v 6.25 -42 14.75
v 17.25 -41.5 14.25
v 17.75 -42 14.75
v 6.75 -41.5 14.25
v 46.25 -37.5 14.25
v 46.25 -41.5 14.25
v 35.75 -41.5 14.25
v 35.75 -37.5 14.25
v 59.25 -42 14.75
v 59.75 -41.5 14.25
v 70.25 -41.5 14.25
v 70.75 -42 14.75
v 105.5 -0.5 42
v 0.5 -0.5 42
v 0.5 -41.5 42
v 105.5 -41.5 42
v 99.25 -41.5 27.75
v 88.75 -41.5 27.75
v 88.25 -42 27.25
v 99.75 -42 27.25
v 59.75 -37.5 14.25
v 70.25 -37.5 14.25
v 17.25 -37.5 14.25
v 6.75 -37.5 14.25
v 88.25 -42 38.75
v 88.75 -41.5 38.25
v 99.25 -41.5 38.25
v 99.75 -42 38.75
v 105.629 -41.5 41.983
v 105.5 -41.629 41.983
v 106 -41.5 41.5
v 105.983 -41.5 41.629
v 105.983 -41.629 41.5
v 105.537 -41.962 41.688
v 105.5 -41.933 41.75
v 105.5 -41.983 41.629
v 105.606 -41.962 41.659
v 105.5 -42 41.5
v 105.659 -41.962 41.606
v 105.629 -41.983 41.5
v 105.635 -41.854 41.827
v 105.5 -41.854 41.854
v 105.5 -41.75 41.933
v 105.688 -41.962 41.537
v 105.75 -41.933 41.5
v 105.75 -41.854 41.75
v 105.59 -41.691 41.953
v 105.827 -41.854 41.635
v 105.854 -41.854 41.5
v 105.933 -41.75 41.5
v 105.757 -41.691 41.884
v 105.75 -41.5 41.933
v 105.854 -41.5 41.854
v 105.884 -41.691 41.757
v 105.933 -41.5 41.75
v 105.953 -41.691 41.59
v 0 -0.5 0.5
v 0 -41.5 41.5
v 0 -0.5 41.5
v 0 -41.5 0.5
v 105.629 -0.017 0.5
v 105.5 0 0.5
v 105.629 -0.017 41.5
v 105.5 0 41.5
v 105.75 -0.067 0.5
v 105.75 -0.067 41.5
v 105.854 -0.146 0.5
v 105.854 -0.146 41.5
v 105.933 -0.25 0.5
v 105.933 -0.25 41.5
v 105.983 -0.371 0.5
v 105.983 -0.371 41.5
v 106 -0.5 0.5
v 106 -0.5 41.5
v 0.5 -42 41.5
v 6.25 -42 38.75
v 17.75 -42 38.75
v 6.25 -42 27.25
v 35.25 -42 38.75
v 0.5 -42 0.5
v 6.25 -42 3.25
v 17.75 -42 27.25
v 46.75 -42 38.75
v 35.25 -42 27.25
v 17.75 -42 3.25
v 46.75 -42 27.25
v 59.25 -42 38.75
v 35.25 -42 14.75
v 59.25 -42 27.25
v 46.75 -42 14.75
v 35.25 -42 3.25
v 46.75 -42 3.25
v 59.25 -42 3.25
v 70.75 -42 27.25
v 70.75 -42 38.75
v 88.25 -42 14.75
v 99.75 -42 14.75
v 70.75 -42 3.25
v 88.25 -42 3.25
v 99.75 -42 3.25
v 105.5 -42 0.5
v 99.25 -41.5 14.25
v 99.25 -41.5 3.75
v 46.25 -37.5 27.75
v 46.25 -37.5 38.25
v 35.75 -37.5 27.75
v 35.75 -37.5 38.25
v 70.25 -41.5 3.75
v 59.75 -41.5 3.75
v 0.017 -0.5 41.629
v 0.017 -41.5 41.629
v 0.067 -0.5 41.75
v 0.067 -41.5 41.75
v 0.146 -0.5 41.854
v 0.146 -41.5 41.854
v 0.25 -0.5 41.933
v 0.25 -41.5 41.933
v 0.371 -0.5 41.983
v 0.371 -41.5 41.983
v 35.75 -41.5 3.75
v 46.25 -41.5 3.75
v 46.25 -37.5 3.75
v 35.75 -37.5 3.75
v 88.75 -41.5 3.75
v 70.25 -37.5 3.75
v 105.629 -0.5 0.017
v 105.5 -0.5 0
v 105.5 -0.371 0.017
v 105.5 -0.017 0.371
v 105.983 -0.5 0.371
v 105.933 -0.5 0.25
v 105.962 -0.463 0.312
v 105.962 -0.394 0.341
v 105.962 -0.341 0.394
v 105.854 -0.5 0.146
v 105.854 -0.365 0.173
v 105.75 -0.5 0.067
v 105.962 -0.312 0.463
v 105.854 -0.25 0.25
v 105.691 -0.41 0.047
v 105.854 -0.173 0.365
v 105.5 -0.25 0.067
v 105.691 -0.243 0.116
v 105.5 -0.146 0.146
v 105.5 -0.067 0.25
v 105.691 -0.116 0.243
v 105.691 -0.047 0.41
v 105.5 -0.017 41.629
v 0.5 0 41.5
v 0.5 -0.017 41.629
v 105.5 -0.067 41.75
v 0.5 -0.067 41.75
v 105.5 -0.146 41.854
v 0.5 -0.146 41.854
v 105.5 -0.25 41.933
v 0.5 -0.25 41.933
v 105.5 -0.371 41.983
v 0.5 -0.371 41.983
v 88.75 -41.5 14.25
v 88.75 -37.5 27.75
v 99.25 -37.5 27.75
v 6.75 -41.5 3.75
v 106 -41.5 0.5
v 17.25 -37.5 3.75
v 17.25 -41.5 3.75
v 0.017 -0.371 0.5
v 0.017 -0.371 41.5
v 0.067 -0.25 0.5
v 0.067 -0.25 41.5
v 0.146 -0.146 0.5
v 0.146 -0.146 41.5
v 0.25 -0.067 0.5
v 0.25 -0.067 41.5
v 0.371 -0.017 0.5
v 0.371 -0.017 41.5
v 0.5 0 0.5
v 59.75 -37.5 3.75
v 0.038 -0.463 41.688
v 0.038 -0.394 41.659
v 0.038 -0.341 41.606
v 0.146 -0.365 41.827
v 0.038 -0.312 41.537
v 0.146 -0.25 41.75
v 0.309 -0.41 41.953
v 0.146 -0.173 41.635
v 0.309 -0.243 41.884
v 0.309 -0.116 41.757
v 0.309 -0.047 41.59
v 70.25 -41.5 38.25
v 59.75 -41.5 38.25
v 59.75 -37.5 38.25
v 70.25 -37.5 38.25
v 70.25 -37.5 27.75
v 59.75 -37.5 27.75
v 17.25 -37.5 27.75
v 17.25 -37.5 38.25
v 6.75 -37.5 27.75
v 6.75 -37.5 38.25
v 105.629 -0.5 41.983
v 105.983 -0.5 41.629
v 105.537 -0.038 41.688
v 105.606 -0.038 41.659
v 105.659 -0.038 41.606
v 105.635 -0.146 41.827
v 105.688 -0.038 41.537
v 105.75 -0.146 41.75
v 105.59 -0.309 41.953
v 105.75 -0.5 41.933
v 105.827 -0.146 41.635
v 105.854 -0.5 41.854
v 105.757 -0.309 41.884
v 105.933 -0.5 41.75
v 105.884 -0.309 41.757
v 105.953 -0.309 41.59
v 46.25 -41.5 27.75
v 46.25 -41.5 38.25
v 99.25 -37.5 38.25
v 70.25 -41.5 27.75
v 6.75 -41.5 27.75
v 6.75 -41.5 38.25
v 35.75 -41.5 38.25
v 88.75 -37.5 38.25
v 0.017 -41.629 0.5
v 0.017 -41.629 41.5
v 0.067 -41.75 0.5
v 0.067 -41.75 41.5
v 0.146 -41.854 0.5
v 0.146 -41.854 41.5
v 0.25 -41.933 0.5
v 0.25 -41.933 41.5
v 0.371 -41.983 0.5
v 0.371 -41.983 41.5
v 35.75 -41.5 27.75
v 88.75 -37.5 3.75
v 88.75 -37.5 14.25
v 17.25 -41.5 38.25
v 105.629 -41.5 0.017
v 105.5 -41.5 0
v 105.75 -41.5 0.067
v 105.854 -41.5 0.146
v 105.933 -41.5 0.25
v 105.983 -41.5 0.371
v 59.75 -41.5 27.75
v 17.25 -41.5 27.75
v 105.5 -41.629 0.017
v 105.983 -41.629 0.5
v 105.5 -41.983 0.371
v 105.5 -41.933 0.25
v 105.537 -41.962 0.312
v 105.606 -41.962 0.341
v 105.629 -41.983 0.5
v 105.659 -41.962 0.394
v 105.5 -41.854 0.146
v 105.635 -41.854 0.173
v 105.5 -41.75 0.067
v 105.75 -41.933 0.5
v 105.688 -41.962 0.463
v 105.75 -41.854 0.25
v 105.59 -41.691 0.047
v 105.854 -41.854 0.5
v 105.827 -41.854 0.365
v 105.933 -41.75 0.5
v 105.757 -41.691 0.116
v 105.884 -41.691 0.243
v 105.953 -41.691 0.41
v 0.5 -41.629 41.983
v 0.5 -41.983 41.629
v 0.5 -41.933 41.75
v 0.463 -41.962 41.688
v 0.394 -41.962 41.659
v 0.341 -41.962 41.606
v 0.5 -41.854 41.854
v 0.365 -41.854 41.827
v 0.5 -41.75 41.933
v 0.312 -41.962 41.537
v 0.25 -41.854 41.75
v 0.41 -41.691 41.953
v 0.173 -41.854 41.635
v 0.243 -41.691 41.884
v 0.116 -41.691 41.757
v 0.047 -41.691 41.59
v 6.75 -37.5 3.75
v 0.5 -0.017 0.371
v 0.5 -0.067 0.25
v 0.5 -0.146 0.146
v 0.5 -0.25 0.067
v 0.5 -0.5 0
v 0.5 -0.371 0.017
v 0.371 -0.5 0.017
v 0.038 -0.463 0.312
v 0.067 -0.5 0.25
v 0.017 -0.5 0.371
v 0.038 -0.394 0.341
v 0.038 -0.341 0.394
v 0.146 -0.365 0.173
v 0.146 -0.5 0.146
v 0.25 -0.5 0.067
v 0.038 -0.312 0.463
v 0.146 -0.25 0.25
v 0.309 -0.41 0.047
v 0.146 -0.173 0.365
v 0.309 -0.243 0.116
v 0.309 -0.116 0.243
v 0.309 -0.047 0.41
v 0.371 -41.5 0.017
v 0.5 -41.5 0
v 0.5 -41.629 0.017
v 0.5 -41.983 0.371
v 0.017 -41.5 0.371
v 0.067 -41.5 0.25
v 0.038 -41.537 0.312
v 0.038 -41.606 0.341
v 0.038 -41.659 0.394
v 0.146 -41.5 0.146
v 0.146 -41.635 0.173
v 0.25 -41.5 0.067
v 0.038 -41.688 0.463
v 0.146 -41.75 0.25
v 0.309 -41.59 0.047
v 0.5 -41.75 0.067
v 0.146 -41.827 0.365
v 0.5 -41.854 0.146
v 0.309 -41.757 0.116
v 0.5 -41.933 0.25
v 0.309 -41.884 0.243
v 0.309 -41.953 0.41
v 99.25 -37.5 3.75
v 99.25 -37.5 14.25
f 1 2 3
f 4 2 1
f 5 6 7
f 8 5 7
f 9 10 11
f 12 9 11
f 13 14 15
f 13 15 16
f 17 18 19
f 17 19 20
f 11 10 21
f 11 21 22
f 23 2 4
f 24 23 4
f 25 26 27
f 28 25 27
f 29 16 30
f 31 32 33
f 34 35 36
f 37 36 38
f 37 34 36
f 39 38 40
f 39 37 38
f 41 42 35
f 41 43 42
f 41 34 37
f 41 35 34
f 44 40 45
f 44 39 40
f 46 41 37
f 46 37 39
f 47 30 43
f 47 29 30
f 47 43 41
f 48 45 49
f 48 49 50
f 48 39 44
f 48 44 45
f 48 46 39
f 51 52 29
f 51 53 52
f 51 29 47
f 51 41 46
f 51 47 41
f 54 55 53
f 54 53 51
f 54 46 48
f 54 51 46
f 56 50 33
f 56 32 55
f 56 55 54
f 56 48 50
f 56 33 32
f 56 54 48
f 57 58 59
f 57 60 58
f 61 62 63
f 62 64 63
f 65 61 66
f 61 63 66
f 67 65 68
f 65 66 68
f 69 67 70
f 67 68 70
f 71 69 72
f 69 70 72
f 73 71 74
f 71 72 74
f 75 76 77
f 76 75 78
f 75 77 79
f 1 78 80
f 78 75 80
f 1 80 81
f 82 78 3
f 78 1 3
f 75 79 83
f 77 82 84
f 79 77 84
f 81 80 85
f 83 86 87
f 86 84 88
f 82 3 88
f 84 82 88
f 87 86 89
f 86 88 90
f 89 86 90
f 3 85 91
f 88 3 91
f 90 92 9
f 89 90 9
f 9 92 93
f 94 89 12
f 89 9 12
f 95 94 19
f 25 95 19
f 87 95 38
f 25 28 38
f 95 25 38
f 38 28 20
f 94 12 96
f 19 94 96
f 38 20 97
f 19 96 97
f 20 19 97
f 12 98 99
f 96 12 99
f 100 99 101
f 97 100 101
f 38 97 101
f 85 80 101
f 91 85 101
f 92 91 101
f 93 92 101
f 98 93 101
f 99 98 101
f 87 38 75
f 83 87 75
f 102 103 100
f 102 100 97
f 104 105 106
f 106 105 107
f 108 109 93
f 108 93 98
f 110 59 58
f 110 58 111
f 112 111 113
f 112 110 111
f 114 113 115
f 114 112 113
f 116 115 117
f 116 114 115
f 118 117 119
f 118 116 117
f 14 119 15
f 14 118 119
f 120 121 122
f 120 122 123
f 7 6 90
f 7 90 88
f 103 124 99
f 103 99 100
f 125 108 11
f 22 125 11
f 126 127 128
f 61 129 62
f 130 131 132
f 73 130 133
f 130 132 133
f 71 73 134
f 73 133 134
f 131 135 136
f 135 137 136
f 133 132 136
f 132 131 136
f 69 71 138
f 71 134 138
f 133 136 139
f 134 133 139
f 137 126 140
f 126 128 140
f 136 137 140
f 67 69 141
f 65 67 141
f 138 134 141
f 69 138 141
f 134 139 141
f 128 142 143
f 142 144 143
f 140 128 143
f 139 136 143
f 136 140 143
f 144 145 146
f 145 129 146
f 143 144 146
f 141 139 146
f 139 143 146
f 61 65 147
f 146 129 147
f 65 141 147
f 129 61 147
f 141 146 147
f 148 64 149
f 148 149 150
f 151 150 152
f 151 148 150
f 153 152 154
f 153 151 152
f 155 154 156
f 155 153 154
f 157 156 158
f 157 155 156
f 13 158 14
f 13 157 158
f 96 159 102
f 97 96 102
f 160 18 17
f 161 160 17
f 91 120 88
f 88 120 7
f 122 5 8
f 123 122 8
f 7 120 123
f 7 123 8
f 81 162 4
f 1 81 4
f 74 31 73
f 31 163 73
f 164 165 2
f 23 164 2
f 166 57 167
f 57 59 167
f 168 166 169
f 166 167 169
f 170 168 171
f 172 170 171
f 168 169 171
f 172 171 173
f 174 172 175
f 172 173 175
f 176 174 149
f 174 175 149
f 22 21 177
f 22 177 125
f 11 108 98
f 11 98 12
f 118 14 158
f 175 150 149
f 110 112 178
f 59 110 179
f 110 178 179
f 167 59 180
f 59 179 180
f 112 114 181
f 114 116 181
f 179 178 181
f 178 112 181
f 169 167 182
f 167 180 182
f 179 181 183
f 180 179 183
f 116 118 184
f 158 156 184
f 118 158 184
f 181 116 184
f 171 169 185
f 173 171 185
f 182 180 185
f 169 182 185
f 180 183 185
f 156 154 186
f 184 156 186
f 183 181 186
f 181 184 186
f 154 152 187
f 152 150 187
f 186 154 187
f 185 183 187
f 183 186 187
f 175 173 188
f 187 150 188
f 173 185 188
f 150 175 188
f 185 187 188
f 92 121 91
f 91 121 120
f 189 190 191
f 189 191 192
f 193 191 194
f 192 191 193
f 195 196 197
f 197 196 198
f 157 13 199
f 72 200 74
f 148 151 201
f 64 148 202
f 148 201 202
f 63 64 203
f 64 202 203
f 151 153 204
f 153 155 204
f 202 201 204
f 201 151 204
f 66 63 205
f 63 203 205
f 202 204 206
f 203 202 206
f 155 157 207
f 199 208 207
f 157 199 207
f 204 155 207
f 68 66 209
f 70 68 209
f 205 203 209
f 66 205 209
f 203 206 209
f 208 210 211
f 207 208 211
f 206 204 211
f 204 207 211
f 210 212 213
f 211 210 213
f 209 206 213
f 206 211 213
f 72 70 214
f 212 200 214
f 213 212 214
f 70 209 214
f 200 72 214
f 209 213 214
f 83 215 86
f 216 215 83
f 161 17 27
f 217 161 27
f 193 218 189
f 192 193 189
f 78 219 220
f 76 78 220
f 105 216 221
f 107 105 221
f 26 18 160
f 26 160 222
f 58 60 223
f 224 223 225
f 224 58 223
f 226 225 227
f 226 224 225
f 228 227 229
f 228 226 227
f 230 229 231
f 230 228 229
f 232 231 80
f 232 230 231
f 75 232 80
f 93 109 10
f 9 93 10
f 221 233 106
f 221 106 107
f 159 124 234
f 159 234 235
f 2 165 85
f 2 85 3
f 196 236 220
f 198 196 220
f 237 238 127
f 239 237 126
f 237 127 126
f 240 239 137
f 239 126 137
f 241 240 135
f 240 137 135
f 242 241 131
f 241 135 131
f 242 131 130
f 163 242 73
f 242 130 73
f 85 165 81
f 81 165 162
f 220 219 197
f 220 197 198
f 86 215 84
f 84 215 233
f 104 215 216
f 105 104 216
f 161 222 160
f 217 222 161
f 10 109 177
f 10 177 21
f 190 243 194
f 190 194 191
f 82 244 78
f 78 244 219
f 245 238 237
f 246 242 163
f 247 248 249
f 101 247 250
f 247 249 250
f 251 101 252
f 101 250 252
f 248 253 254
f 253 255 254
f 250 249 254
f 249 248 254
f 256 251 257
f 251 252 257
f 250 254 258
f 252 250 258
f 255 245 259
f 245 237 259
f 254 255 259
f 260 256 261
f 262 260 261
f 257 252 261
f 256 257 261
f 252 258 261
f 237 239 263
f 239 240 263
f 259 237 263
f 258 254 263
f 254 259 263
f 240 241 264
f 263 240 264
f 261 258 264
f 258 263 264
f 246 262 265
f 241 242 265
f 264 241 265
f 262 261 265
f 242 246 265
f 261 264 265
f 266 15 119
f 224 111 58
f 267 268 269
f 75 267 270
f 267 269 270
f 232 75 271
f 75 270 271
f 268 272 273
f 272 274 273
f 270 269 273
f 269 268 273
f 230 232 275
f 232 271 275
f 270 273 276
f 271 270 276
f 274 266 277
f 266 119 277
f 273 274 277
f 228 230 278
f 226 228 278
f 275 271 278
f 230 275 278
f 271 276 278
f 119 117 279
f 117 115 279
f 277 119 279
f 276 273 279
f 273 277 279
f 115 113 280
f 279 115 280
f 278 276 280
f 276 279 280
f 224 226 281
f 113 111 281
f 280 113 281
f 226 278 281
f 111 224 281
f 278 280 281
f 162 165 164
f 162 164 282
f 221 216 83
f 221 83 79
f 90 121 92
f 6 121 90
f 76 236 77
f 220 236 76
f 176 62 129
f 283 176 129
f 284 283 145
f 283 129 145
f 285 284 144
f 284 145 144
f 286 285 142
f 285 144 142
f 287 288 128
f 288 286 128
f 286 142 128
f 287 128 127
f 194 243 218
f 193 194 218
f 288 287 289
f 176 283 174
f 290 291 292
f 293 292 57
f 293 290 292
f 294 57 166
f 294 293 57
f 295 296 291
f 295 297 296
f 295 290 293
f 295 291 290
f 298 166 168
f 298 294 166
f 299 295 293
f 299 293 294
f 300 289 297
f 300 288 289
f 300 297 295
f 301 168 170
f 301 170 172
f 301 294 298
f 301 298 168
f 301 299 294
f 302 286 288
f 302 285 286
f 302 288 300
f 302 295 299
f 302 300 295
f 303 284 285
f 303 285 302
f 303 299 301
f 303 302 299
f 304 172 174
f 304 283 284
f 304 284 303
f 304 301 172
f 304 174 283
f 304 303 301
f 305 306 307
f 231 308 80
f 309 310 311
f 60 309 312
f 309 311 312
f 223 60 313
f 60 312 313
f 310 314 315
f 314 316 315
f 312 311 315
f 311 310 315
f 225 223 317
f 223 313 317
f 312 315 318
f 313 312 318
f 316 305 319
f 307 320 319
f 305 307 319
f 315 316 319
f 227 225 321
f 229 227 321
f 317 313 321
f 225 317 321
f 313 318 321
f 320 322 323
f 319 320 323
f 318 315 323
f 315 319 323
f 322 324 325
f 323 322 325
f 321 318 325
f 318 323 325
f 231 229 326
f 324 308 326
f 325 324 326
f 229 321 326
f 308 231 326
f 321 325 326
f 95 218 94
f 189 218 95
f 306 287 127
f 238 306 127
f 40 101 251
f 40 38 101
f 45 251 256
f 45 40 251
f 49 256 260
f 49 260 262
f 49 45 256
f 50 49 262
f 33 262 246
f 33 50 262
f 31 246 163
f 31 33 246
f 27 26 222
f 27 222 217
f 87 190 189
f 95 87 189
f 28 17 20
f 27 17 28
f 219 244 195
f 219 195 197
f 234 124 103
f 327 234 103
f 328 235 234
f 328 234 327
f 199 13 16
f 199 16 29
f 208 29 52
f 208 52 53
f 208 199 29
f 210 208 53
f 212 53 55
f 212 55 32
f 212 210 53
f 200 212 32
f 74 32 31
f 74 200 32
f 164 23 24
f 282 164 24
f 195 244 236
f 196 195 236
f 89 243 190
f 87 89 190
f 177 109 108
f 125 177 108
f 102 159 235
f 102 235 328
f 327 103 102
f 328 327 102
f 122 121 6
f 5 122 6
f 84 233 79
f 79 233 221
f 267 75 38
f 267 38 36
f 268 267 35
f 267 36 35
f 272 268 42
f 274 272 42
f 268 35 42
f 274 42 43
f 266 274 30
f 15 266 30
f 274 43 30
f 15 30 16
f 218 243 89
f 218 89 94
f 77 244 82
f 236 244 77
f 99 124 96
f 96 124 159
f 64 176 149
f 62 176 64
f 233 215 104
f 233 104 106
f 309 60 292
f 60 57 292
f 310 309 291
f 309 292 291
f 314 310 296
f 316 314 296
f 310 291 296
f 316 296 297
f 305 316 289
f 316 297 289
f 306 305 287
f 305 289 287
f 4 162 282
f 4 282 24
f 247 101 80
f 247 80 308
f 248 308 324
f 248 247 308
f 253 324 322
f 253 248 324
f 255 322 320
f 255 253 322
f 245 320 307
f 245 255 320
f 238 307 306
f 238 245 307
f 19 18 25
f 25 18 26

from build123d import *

# Parameters (mm, degrees)
ESQUISSE1_W             = 106
ESQUISSE1_H             = 42
BOSS_EXTRU_1_DEPTH      = 42
ESQUISSE2_W             = 10.5
ESQUISSE2_H             = 10.5
ENL_V_MAT_EXTRU_1_DEPTH = 4.5
CONG_1_R                = 0.5
CHANFREIN1_SIZE         = 0.5


with BuildPart() as part:
    # Esquisse1 → Boss.-Extru.1 (new body)
    with BuildSketch(Plane.XY):
        with Locations((53, -21)):
            Rectangle(ESQUISSE1_W, ESQUISSE1_H)
    extrude(amount=BOSS_EXTRU_1_DEPTH)

    # Esquisse2 → Enlèv. mat.-Extru.1 (cut)
    with BuildSketch(Plane.XZ.offset(42)):
        with Locations((65, 33)):
            Rectangle(ESQUISSE2_W, ESQUISSE2_H)
        with Locations((94, 9)):
            Rectangle(ESQUISSE2_W, ESQUISSE2_H)
        with Locations((94, 33)):
            Rectangle(ESQUISSE2_W, ESQUISSE2_H)
        with Locations((65, 9)):
            Rectangle(ESQUISSE2_W, ESQUISSE2_H)
    enl_v_mat_extru_1 = extrude(amount=-ENL_V_MAT_EXTRU_1_DEPTH, mode=Mode.SUBTRACT)

    # Congé1
    cong_1_edges = [part.edges().sort_by_distance(p)[0] for p in [
        (106, -21, 42),
        (53, 0, 42),
        (0, -21, 42),
        (53, 0, 0),
        (106, -21, 0),
        (53, -42, 0),
        (0, -21, 0),
        (53, -42, 42),
        (0, 0, 21),
        (106, 0, 21),
        (106, -42, 21),
        (0, -42, 21),
    ]]
    fillet(cong_1_edges, radius=CONG_1_R)

    # Symétrie1: Enlèv. mat.-Extru.1 across plane
    add(enl_v_mat_extru_1.mirror(Plane(origin=(53, 0, 0), x_dir=(0, 0, 1), z_dir=(1, 0, 0))), mode=Mode.SUBTRACT)

    # Chanfrein1
    chanfrein1_edges = [part.edges().sort_by_distance(p)[0] for p in [
        (46.25, -42, 33),
        (41, -42, 27.75),
        (35.75, -42, 33),
        (41, -42, 38.25),
        (46.25, -42, 9),
        (41, -42, 3.75),
        (35.75, -42, 9),
        (41, -42, 14.25),
        (17.25, -42, 9),
        (12, -42, 3.75),
        (6.75, -42, 9),
        (12, -42, 14.25),
        (17.25, -42, 33),
        (12, -42, 27.75),
        (6.75, -42, 33),
        (12, -42, 38.25),
        (59.75, -42, 33),
        (65, -42, 27.75),
        (70.25, -42, 33),
        (65, -42, 38.25),
        (59.75, -42, 9),
        (65, -42, 3.75),
        (70.25, -42, 9),
        (65, -42, 14.25),
        (88.75, -42, 9),
        (94, -42, 3.75),
        (99.25, -42, 9),
        (94, -42, 14.25),
        (88.75, -42, 33),
        (94, -42, 27.75),
        (99.25, -42, 33),
        (94, -42, 38.25),
    ]]
    chamfer(chanfrein1_edges, length=CHANFREIN1_SIZE)


solid = part.part
